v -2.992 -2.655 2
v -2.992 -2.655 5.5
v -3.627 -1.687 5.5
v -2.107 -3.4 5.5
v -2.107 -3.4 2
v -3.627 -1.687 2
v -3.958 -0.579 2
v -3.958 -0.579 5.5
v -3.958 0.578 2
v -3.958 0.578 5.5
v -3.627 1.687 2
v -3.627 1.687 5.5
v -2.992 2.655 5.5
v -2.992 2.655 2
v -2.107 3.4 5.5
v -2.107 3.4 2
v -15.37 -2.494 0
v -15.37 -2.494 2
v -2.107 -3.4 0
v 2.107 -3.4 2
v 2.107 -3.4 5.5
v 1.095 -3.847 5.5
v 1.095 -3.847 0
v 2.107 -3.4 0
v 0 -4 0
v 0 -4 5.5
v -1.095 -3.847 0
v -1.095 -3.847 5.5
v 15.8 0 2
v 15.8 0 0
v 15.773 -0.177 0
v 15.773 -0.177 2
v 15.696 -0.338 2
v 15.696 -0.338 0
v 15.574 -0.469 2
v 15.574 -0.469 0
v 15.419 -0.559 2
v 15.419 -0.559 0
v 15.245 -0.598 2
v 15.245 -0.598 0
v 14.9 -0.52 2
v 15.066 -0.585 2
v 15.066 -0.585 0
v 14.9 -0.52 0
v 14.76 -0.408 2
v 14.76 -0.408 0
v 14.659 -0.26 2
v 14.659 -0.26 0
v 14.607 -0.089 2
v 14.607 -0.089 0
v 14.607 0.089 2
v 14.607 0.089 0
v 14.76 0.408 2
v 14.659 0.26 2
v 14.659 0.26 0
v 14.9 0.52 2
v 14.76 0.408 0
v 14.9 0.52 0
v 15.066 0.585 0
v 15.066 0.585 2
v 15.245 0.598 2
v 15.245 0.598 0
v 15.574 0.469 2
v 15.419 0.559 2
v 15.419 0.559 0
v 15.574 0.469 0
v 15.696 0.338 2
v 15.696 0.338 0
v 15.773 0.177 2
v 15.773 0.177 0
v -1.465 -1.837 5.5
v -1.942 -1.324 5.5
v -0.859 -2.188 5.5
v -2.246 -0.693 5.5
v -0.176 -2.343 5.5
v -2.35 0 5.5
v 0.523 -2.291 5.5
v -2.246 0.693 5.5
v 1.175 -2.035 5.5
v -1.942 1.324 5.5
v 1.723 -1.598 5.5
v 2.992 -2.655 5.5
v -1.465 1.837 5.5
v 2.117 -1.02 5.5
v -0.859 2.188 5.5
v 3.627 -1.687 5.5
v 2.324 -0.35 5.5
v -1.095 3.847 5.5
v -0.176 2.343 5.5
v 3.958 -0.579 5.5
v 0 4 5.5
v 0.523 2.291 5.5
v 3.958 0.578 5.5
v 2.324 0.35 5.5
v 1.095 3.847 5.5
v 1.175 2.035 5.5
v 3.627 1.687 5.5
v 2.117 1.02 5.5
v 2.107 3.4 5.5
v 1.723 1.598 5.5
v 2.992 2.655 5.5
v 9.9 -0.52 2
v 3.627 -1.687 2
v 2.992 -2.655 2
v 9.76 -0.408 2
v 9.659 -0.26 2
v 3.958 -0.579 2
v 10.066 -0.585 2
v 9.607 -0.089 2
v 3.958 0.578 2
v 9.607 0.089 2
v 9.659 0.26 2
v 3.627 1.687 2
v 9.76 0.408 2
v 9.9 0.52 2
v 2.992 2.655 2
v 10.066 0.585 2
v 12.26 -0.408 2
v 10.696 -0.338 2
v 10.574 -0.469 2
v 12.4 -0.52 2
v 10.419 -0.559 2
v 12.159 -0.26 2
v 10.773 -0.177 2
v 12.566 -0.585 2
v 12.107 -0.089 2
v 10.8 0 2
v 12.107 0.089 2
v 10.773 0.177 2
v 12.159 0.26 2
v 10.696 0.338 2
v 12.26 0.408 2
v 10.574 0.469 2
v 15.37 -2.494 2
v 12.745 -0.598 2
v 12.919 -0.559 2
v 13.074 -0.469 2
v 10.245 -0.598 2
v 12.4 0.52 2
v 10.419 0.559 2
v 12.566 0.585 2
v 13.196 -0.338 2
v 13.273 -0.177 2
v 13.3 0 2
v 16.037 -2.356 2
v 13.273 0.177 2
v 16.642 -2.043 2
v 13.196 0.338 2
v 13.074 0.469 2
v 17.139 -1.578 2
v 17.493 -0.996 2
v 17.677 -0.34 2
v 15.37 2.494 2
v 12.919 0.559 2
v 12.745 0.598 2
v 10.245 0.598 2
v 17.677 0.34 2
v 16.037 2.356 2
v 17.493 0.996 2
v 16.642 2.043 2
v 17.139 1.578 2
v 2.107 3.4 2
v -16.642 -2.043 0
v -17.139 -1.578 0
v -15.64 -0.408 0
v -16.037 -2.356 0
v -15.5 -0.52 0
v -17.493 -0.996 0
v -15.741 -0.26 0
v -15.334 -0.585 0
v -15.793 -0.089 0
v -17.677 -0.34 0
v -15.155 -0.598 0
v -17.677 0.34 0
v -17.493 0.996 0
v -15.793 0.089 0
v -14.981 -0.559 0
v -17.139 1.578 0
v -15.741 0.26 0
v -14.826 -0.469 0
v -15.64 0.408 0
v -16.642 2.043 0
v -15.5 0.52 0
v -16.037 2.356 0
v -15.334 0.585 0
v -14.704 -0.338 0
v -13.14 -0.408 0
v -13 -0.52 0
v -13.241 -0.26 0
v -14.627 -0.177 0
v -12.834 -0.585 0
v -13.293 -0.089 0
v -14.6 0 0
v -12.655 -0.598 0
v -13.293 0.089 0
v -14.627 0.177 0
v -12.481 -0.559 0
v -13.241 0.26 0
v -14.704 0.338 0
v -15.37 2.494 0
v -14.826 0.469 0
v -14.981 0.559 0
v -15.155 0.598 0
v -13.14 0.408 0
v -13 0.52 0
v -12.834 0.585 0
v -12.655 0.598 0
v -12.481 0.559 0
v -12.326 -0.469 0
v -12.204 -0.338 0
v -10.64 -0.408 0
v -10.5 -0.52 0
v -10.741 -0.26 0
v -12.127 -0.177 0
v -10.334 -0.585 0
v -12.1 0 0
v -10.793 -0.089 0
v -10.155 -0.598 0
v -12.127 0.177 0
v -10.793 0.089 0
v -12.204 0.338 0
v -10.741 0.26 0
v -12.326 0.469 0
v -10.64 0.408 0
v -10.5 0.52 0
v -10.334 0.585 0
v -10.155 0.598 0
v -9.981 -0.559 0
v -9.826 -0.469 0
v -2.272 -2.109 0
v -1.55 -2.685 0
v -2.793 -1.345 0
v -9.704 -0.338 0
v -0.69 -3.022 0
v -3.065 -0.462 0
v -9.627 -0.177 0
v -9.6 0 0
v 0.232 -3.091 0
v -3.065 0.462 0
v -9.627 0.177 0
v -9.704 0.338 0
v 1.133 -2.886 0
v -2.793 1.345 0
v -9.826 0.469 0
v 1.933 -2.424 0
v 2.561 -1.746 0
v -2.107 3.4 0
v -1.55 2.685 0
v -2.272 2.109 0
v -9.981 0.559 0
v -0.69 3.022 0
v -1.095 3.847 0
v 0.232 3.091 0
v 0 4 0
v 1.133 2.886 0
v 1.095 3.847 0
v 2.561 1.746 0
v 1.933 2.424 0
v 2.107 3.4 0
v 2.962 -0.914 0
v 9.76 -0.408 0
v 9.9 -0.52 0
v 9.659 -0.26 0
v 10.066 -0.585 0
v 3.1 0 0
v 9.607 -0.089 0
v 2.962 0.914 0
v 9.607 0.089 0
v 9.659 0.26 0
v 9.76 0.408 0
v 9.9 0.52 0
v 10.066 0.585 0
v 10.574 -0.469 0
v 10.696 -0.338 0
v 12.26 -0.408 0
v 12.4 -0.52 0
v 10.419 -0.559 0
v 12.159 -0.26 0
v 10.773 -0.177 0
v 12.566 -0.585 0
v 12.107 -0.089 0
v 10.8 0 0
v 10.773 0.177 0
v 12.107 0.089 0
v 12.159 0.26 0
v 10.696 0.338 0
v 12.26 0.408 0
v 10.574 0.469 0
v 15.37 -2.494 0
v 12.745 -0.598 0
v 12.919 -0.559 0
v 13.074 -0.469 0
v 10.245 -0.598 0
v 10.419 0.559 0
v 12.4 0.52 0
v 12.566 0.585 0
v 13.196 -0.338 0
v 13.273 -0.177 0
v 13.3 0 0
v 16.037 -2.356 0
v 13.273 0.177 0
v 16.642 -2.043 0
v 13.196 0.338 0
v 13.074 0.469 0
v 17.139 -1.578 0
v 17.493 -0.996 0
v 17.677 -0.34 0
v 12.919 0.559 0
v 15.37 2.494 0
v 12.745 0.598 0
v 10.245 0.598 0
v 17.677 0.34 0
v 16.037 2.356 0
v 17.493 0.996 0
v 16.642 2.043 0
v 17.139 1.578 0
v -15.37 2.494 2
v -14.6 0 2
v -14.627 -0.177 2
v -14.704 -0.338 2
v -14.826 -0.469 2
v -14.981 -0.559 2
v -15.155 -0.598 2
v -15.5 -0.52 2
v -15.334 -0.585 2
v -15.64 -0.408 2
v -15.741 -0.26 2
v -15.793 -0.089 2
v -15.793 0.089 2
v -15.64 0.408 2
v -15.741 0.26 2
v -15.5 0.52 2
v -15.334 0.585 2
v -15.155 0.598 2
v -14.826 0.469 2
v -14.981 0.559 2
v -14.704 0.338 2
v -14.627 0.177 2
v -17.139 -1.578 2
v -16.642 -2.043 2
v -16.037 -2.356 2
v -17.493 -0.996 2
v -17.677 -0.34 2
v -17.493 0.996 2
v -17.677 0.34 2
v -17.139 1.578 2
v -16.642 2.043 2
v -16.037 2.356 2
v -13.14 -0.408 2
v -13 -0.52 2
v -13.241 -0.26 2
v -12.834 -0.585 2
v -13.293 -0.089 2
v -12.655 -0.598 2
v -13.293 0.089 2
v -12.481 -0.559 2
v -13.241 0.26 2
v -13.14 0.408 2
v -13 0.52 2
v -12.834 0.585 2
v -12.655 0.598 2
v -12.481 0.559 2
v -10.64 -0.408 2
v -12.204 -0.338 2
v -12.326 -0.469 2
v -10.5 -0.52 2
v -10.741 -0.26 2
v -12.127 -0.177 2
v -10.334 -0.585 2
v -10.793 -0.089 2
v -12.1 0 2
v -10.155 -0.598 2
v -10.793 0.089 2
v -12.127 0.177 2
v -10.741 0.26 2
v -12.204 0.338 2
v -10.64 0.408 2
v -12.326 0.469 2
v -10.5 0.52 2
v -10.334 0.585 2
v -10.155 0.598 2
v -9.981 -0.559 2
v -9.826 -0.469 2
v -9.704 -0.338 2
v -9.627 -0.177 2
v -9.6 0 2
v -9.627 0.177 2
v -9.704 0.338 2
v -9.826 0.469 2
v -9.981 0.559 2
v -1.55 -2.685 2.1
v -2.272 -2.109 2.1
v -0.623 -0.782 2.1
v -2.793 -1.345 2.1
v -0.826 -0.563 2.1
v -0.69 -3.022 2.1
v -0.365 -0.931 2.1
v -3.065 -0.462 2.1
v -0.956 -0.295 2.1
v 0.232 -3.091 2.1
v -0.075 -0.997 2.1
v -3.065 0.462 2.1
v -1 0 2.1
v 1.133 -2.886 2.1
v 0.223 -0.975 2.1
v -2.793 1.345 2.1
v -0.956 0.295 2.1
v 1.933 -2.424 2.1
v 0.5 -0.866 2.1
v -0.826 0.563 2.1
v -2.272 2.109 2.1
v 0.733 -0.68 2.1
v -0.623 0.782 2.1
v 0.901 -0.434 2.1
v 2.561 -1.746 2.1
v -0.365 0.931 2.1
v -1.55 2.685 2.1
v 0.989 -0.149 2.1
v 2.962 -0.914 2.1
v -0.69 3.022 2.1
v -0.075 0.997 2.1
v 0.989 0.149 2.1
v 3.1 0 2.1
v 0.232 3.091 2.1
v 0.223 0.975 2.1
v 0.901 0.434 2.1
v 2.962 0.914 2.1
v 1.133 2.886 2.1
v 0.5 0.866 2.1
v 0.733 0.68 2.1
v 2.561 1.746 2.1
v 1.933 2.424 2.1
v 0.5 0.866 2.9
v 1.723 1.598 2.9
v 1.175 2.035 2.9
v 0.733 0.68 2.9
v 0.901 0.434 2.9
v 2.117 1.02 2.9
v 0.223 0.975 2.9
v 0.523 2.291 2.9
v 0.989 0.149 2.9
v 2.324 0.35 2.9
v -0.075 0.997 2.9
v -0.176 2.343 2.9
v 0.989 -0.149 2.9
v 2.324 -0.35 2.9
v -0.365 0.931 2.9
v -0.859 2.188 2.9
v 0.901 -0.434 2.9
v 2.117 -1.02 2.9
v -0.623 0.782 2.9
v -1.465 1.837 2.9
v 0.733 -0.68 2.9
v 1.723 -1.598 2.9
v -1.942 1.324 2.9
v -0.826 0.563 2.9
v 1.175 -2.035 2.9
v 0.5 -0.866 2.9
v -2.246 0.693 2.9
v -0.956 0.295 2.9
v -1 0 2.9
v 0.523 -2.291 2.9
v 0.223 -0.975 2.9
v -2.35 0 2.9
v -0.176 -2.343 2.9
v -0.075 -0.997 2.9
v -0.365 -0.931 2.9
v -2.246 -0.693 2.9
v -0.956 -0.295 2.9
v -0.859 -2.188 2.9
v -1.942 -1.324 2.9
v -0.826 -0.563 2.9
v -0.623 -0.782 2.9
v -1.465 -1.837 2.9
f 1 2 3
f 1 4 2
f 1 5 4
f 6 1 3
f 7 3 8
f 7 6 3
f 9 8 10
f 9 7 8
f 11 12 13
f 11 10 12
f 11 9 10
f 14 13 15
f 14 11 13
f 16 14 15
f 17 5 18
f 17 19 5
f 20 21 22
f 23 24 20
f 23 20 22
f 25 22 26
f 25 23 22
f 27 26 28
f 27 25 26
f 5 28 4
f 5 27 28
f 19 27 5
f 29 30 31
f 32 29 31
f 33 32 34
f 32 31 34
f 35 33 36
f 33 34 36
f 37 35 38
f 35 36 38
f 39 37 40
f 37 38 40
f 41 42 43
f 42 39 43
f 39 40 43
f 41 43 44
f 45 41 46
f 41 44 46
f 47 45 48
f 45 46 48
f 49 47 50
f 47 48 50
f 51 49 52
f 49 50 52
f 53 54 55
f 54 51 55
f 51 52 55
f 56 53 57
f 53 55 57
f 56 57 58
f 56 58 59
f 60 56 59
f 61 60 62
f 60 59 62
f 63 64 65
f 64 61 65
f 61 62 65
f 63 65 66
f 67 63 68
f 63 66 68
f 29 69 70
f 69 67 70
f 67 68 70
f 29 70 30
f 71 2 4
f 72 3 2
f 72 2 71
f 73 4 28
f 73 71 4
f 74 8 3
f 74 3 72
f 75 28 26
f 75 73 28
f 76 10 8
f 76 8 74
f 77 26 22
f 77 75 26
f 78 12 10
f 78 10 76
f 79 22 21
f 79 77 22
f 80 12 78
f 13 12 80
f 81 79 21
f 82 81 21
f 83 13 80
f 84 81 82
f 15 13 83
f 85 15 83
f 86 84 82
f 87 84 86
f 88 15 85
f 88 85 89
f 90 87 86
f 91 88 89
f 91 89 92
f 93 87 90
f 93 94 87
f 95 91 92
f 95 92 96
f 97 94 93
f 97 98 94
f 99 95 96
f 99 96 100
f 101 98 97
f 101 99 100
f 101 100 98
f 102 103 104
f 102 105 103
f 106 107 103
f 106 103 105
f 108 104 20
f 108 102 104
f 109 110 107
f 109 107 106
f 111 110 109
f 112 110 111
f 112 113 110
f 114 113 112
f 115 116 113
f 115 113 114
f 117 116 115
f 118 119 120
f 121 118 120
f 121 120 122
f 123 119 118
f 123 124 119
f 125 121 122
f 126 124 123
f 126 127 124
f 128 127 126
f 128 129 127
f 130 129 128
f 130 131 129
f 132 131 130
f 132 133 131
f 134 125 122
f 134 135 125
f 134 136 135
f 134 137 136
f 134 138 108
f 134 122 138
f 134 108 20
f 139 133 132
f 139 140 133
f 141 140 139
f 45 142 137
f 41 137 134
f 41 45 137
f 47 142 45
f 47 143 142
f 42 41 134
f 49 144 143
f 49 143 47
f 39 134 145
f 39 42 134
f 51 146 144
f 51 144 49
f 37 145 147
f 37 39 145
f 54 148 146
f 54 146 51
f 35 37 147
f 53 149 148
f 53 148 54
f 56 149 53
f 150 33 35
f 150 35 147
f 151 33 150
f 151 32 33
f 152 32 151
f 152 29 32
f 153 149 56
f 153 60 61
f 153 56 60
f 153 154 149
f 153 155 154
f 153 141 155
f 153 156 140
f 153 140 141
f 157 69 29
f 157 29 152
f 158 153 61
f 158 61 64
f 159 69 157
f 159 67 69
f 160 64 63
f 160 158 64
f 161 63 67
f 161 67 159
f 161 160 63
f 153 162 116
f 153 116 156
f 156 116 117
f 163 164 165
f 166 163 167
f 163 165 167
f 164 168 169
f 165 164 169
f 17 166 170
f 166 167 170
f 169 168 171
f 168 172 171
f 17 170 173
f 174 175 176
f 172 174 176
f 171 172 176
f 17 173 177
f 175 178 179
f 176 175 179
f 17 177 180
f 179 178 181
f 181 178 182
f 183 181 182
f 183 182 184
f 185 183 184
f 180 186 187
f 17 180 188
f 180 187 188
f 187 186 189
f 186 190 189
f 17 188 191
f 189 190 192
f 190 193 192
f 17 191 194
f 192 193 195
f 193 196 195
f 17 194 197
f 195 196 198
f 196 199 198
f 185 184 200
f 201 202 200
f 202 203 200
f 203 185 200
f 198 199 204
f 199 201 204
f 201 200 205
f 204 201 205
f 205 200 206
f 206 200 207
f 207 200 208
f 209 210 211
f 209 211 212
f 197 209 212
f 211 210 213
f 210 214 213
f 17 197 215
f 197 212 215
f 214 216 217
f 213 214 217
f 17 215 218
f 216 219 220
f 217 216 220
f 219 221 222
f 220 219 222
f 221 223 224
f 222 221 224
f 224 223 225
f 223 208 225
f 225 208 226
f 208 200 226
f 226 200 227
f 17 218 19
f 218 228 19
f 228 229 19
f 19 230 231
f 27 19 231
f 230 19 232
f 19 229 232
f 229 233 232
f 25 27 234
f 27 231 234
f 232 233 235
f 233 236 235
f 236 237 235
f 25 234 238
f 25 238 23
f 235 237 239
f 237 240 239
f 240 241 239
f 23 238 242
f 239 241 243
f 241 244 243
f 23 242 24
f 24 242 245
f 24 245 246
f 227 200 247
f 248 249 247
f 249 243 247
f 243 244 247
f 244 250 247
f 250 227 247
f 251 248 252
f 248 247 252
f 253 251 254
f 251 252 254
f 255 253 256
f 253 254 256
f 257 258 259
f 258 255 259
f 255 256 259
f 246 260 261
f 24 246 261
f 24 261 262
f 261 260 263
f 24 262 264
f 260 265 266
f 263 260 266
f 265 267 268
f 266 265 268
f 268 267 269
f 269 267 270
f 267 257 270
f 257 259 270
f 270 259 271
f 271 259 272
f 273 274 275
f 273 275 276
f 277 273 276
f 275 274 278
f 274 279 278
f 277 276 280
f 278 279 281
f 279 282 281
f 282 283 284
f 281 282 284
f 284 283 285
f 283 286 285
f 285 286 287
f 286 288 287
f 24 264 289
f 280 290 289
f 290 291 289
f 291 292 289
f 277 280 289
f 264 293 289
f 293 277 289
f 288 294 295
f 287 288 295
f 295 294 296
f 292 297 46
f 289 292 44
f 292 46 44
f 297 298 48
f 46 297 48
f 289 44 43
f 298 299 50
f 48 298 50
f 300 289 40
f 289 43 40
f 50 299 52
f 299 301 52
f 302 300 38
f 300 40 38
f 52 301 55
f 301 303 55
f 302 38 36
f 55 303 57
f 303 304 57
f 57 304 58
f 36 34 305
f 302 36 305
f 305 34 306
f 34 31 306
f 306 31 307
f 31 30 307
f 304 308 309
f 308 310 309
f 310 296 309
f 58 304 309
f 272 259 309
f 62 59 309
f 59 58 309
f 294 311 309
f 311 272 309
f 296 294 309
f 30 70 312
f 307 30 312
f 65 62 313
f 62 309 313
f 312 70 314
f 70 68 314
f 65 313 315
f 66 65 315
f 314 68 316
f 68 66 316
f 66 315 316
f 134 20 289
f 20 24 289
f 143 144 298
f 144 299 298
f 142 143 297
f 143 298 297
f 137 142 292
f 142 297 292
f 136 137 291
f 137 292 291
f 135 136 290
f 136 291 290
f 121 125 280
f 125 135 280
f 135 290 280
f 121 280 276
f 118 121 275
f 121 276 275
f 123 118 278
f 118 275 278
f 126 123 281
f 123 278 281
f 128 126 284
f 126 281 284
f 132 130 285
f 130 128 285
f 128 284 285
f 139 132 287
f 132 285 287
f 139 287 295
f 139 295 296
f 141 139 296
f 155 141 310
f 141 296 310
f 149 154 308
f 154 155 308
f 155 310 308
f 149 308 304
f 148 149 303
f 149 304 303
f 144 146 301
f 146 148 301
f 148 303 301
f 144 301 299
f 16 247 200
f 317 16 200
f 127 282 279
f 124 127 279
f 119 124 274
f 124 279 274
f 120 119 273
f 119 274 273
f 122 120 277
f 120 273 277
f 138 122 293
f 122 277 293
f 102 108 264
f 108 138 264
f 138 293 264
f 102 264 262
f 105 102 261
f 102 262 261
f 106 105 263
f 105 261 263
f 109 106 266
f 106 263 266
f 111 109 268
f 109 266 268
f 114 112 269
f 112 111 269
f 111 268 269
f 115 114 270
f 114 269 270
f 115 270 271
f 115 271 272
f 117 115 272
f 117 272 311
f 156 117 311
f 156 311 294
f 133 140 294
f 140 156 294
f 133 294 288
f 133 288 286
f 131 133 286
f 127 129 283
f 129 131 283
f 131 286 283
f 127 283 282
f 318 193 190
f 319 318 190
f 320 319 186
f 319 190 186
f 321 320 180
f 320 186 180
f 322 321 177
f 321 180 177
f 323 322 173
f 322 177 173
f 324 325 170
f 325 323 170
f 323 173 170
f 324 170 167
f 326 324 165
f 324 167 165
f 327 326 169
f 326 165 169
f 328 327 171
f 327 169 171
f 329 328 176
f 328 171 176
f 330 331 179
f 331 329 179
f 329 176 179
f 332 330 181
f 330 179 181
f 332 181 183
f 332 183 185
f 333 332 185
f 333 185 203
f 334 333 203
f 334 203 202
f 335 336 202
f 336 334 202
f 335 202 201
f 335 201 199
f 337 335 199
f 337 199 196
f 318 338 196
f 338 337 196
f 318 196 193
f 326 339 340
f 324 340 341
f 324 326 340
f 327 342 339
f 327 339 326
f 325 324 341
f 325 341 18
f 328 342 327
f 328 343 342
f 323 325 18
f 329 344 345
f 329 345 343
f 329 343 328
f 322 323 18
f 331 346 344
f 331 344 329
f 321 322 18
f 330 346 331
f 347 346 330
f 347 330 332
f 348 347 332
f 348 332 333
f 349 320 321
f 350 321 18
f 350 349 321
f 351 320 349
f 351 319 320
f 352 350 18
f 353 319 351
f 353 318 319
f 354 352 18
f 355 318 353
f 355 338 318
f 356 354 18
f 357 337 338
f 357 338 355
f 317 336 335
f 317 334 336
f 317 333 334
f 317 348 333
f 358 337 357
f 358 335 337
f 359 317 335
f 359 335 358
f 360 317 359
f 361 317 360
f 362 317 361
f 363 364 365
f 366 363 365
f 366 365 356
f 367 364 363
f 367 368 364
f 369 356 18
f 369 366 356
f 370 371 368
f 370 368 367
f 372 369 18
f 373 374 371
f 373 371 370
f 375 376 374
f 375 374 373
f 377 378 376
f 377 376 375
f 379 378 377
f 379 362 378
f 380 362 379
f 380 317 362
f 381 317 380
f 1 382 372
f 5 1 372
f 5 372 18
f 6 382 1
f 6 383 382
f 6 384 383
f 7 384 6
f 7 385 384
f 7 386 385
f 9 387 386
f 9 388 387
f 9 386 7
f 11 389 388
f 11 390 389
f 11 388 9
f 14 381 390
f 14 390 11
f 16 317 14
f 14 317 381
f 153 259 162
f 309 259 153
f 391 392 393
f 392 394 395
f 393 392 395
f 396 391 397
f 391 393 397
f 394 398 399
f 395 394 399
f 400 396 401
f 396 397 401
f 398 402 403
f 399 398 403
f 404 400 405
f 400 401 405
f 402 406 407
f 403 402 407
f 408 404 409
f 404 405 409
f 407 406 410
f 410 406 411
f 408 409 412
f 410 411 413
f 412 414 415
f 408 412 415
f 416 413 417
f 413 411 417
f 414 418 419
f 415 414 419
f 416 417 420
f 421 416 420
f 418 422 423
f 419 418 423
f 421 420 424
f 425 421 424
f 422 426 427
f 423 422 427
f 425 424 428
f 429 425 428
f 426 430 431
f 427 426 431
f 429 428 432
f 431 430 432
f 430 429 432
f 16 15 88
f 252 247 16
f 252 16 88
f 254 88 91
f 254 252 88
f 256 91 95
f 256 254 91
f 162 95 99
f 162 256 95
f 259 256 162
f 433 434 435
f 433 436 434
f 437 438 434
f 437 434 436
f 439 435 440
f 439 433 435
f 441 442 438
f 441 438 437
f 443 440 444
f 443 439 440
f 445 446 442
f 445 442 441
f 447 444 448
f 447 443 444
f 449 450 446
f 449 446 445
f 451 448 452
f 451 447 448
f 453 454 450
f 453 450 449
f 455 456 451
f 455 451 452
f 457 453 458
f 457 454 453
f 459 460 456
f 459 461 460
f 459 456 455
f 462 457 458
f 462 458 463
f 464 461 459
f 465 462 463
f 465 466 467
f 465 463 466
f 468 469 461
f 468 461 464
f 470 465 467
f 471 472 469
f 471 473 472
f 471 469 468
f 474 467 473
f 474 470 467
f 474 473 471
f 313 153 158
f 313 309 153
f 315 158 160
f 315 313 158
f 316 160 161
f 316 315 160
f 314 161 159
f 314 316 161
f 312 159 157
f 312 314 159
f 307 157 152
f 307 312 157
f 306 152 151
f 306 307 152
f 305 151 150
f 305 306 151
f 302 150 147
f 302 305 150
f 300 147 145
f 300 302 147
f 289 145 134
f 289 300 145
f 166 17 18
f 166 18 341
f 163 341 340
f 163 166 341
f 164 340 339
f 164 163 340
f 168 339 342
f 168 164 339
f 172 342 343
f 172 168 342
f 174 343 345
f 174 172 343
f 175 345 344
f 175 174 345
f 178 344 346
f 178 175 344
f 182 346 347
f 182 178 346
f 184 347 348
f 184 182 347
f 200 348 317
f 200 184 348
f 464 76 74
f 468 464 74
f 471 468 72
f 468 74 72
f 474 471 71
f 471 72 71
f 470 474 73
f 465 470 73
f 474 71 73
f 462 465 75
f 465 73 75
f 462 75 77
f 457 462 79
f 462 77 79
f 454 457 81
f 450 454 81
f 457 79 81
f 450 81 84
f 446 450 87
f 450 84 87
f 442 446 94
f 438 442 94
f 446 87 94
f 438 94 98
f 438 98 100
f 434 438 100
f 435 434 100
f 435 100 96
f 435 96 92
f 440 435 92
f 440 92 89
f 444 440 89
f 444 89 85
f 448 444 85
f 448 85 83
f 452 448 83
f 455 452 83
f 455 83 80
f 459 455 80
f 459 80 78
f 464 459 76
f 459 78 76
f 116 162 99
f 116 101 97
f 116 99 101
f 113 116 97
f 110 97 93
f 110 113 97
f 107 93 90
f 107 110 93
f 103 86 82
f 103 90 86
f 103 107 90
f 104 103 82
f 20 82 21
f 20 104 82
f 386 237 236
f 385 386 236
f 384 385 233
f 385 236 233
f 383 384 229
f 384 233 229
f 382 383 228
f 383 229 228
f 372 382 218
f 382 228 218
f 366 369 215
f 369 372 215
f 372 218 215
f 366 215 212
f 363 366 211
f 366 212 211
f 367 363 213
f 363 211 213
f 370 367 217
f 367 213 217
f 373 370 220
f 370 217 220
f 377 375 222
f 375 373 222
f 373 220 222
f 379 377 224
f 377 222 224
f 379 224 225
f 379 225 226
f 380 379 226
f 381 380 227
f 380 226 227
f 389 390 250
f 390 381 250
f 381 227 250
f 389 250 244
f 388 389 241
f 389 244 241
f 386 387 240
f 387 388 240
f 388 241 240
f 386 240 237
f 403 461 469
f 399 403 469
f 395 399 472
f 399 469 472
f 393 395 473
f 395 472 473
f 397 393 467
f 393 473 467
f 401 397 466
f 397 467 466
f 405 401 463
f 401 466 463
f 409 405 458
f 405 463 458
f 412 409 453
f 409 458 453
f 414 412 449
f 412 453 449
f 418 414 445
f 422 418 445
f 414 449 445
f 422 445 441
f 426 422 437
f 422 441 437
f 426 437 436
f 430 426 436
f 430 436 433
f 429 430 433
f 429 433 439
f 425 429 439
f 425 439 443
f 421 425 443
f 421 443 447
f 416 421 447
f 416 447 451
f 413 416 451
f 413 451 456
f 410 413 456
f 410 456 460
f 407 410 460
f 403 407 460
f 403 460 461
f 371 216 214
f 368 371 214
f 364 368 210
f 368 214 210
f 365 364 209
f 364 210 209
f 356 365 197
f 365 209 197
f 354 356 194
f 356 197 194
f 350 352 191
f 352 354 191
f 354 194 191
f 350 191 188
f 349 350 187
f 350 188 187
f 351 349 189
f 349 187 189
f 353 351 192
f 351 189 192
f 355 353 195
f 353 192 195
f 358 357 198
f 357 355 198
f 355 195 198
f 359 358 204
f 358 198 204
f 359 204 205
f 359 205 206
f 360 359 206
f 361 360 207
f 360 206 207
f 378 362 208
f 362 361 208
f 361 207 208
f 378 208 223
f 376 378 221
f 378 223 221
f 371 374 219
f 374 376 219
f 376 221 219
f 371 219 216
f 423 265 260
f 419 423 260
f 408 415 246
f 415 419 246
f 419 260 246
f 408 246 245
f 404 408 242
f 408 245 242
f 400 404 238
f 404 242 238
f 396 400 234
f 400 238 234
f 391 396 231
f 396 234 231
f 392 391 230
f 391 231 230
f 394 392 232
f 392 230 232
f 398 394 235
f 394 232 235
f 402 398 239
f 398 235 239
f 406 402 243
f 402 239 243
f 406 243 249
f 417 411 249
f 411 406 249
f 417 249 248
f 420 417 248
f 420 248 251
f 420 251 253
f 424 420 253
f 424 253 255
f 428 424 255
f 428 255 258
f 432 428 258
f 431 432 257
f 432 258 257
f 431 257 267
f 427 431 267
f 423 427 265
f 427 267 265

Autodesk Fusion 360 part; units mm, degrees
sketch "スケッチ1" plane through (0, 0, 0) normal (0, 0, 1) x (1, 0, 0)
  line L0 (2.1072, 3.4) -> (-2.1072, 3.4) construction
  line L1 (-2.1071, -3.4) -> (2.1071, -3.4) construction
  line L2 (17.7, 3.4) -> (-17.7, 3.4) construction
  line L3 (-17.7, 3.4) -> (-17.7, -3.4) construction
  line L4 (-17.7, -3.4) -> (17.7, -3.4) construction
  line L5 (17.7, -3.4) -> (17.7, 3.4) construction
  line L6 (17.7, 3.4) -> (-17.7, -3.4) construction
  line L7 (-17.7, 3.4) -> (17.7, -3.4) construction
  line L8 (-2.1072, 3.4) -> (-15.3703, 2.4942)
  line L9 (-2.1071, -3.4) -> (-15.3703, -2.4942)
  line L10 (2.1072, 3.4) -> (15.3703, 2.4942)
  line L11 (2.1071, -3.4) -> (15.3703, -2.4942)
  arc A0 (-15.3703, 2.4942) -> (-15.3703, -2.4942) centre (-15.2, 0) ccw
  arc A1 (15.3703, -2.4942) -> (15.3703, 2.4942) centre (15.2, 0) ccw
  arc A2 (2.1072, 3.4) -> (-2.1072, 3.4) centre (0, 0) ccw
  arc A3 (-2.1072, 3.4) -> (-2.1071, -3.4) centre (0, 0) ccw
  arc A4 (2.1071, -3.4) -> (2.1072, 3.4) centre (0, 0) ccw
  arc A5 (-2.1071, -3.4) -> (2.1071, -3.4) centre (0, 0) ccw
  line L12 (-2.1072, 3.4) -> (2.1072, 3.4)
  line L13 (-2.1071, -3.4) -> (2.1071, -3.4)
  circle A6 centre (-15.2, 0) radius 0.6
  circle A7 centre (-12.7, 0) radius 0.6
  circle A8 centre (-10.2, 0) radius 0.6
  line L14 (0, 1.75) -> (0, 22.5) construction
  circle A9 centre (10.2, 0) radius 0.6
  circle A10 centre (12.7, 0) radius 0.6
  circle A11 centre (15.2, 0) radius 0.6
  dimension "d1" = 8
  dimension "d5" = 6.8
  dimension "d6" = 35.4
  dimension "d7" = 6.8
  dimension "d8" = 2.5
  dimension "d9" = 2.5
  dimension "d10" = 1.2
  dimension "d11" = 2.5
  dimension "d14" = 2.5
  dimension "d15" = 0
extrude "押し出し1" add sketch "スケッチ1" along normal blind 5.5 contours A3 A4 L12 L13 | A2 L12 | A5 L13 makes body 1
extrude "押し出し2" add sketch "スケッチ1" along normal blind 2 contours L8 L9 A0 A3 | L10 L11 A1 A4 bodies 1
sketch "スケッチ2" plane through (0, 0, 5.5) normal (0, 0, 1) x (-1, 0, 0)
  circle A0 centre (0, 0) radius 4
  circle A1 centre (0, 0) radius 1
  circle A2 centre (0, 0) radius 2.35
  dimension "d23" = 2
  dimension "d24" = 4.7
extrude "押し出し3" cut sketch "スケッチ2" against normal through all contours A1 bodies 1
extrude "押し出し4" cut sketch "スケッチ2" against normal blind 2.6 contours A2 bodies 1
sketch "スケッチ3" plane through (0, 0, 0) normal (0, 0, 1) x (1, 0, 0)
  circle A0 centre (0, 0) radius 3.1
  dimension "d28" = 6.2
extrude "押し出し5" cut sketch "スケッチ3" along normal blind 2.1 bodies 1
copy_body "ボディ -> コンポーネント1" bodies 1 removing the originals makes body 2 in component "Component'"
component "Component'" placed x (1, 0, 0) y (0, 1, 0) z (0, 0, 1) at (0, 0, 0)
